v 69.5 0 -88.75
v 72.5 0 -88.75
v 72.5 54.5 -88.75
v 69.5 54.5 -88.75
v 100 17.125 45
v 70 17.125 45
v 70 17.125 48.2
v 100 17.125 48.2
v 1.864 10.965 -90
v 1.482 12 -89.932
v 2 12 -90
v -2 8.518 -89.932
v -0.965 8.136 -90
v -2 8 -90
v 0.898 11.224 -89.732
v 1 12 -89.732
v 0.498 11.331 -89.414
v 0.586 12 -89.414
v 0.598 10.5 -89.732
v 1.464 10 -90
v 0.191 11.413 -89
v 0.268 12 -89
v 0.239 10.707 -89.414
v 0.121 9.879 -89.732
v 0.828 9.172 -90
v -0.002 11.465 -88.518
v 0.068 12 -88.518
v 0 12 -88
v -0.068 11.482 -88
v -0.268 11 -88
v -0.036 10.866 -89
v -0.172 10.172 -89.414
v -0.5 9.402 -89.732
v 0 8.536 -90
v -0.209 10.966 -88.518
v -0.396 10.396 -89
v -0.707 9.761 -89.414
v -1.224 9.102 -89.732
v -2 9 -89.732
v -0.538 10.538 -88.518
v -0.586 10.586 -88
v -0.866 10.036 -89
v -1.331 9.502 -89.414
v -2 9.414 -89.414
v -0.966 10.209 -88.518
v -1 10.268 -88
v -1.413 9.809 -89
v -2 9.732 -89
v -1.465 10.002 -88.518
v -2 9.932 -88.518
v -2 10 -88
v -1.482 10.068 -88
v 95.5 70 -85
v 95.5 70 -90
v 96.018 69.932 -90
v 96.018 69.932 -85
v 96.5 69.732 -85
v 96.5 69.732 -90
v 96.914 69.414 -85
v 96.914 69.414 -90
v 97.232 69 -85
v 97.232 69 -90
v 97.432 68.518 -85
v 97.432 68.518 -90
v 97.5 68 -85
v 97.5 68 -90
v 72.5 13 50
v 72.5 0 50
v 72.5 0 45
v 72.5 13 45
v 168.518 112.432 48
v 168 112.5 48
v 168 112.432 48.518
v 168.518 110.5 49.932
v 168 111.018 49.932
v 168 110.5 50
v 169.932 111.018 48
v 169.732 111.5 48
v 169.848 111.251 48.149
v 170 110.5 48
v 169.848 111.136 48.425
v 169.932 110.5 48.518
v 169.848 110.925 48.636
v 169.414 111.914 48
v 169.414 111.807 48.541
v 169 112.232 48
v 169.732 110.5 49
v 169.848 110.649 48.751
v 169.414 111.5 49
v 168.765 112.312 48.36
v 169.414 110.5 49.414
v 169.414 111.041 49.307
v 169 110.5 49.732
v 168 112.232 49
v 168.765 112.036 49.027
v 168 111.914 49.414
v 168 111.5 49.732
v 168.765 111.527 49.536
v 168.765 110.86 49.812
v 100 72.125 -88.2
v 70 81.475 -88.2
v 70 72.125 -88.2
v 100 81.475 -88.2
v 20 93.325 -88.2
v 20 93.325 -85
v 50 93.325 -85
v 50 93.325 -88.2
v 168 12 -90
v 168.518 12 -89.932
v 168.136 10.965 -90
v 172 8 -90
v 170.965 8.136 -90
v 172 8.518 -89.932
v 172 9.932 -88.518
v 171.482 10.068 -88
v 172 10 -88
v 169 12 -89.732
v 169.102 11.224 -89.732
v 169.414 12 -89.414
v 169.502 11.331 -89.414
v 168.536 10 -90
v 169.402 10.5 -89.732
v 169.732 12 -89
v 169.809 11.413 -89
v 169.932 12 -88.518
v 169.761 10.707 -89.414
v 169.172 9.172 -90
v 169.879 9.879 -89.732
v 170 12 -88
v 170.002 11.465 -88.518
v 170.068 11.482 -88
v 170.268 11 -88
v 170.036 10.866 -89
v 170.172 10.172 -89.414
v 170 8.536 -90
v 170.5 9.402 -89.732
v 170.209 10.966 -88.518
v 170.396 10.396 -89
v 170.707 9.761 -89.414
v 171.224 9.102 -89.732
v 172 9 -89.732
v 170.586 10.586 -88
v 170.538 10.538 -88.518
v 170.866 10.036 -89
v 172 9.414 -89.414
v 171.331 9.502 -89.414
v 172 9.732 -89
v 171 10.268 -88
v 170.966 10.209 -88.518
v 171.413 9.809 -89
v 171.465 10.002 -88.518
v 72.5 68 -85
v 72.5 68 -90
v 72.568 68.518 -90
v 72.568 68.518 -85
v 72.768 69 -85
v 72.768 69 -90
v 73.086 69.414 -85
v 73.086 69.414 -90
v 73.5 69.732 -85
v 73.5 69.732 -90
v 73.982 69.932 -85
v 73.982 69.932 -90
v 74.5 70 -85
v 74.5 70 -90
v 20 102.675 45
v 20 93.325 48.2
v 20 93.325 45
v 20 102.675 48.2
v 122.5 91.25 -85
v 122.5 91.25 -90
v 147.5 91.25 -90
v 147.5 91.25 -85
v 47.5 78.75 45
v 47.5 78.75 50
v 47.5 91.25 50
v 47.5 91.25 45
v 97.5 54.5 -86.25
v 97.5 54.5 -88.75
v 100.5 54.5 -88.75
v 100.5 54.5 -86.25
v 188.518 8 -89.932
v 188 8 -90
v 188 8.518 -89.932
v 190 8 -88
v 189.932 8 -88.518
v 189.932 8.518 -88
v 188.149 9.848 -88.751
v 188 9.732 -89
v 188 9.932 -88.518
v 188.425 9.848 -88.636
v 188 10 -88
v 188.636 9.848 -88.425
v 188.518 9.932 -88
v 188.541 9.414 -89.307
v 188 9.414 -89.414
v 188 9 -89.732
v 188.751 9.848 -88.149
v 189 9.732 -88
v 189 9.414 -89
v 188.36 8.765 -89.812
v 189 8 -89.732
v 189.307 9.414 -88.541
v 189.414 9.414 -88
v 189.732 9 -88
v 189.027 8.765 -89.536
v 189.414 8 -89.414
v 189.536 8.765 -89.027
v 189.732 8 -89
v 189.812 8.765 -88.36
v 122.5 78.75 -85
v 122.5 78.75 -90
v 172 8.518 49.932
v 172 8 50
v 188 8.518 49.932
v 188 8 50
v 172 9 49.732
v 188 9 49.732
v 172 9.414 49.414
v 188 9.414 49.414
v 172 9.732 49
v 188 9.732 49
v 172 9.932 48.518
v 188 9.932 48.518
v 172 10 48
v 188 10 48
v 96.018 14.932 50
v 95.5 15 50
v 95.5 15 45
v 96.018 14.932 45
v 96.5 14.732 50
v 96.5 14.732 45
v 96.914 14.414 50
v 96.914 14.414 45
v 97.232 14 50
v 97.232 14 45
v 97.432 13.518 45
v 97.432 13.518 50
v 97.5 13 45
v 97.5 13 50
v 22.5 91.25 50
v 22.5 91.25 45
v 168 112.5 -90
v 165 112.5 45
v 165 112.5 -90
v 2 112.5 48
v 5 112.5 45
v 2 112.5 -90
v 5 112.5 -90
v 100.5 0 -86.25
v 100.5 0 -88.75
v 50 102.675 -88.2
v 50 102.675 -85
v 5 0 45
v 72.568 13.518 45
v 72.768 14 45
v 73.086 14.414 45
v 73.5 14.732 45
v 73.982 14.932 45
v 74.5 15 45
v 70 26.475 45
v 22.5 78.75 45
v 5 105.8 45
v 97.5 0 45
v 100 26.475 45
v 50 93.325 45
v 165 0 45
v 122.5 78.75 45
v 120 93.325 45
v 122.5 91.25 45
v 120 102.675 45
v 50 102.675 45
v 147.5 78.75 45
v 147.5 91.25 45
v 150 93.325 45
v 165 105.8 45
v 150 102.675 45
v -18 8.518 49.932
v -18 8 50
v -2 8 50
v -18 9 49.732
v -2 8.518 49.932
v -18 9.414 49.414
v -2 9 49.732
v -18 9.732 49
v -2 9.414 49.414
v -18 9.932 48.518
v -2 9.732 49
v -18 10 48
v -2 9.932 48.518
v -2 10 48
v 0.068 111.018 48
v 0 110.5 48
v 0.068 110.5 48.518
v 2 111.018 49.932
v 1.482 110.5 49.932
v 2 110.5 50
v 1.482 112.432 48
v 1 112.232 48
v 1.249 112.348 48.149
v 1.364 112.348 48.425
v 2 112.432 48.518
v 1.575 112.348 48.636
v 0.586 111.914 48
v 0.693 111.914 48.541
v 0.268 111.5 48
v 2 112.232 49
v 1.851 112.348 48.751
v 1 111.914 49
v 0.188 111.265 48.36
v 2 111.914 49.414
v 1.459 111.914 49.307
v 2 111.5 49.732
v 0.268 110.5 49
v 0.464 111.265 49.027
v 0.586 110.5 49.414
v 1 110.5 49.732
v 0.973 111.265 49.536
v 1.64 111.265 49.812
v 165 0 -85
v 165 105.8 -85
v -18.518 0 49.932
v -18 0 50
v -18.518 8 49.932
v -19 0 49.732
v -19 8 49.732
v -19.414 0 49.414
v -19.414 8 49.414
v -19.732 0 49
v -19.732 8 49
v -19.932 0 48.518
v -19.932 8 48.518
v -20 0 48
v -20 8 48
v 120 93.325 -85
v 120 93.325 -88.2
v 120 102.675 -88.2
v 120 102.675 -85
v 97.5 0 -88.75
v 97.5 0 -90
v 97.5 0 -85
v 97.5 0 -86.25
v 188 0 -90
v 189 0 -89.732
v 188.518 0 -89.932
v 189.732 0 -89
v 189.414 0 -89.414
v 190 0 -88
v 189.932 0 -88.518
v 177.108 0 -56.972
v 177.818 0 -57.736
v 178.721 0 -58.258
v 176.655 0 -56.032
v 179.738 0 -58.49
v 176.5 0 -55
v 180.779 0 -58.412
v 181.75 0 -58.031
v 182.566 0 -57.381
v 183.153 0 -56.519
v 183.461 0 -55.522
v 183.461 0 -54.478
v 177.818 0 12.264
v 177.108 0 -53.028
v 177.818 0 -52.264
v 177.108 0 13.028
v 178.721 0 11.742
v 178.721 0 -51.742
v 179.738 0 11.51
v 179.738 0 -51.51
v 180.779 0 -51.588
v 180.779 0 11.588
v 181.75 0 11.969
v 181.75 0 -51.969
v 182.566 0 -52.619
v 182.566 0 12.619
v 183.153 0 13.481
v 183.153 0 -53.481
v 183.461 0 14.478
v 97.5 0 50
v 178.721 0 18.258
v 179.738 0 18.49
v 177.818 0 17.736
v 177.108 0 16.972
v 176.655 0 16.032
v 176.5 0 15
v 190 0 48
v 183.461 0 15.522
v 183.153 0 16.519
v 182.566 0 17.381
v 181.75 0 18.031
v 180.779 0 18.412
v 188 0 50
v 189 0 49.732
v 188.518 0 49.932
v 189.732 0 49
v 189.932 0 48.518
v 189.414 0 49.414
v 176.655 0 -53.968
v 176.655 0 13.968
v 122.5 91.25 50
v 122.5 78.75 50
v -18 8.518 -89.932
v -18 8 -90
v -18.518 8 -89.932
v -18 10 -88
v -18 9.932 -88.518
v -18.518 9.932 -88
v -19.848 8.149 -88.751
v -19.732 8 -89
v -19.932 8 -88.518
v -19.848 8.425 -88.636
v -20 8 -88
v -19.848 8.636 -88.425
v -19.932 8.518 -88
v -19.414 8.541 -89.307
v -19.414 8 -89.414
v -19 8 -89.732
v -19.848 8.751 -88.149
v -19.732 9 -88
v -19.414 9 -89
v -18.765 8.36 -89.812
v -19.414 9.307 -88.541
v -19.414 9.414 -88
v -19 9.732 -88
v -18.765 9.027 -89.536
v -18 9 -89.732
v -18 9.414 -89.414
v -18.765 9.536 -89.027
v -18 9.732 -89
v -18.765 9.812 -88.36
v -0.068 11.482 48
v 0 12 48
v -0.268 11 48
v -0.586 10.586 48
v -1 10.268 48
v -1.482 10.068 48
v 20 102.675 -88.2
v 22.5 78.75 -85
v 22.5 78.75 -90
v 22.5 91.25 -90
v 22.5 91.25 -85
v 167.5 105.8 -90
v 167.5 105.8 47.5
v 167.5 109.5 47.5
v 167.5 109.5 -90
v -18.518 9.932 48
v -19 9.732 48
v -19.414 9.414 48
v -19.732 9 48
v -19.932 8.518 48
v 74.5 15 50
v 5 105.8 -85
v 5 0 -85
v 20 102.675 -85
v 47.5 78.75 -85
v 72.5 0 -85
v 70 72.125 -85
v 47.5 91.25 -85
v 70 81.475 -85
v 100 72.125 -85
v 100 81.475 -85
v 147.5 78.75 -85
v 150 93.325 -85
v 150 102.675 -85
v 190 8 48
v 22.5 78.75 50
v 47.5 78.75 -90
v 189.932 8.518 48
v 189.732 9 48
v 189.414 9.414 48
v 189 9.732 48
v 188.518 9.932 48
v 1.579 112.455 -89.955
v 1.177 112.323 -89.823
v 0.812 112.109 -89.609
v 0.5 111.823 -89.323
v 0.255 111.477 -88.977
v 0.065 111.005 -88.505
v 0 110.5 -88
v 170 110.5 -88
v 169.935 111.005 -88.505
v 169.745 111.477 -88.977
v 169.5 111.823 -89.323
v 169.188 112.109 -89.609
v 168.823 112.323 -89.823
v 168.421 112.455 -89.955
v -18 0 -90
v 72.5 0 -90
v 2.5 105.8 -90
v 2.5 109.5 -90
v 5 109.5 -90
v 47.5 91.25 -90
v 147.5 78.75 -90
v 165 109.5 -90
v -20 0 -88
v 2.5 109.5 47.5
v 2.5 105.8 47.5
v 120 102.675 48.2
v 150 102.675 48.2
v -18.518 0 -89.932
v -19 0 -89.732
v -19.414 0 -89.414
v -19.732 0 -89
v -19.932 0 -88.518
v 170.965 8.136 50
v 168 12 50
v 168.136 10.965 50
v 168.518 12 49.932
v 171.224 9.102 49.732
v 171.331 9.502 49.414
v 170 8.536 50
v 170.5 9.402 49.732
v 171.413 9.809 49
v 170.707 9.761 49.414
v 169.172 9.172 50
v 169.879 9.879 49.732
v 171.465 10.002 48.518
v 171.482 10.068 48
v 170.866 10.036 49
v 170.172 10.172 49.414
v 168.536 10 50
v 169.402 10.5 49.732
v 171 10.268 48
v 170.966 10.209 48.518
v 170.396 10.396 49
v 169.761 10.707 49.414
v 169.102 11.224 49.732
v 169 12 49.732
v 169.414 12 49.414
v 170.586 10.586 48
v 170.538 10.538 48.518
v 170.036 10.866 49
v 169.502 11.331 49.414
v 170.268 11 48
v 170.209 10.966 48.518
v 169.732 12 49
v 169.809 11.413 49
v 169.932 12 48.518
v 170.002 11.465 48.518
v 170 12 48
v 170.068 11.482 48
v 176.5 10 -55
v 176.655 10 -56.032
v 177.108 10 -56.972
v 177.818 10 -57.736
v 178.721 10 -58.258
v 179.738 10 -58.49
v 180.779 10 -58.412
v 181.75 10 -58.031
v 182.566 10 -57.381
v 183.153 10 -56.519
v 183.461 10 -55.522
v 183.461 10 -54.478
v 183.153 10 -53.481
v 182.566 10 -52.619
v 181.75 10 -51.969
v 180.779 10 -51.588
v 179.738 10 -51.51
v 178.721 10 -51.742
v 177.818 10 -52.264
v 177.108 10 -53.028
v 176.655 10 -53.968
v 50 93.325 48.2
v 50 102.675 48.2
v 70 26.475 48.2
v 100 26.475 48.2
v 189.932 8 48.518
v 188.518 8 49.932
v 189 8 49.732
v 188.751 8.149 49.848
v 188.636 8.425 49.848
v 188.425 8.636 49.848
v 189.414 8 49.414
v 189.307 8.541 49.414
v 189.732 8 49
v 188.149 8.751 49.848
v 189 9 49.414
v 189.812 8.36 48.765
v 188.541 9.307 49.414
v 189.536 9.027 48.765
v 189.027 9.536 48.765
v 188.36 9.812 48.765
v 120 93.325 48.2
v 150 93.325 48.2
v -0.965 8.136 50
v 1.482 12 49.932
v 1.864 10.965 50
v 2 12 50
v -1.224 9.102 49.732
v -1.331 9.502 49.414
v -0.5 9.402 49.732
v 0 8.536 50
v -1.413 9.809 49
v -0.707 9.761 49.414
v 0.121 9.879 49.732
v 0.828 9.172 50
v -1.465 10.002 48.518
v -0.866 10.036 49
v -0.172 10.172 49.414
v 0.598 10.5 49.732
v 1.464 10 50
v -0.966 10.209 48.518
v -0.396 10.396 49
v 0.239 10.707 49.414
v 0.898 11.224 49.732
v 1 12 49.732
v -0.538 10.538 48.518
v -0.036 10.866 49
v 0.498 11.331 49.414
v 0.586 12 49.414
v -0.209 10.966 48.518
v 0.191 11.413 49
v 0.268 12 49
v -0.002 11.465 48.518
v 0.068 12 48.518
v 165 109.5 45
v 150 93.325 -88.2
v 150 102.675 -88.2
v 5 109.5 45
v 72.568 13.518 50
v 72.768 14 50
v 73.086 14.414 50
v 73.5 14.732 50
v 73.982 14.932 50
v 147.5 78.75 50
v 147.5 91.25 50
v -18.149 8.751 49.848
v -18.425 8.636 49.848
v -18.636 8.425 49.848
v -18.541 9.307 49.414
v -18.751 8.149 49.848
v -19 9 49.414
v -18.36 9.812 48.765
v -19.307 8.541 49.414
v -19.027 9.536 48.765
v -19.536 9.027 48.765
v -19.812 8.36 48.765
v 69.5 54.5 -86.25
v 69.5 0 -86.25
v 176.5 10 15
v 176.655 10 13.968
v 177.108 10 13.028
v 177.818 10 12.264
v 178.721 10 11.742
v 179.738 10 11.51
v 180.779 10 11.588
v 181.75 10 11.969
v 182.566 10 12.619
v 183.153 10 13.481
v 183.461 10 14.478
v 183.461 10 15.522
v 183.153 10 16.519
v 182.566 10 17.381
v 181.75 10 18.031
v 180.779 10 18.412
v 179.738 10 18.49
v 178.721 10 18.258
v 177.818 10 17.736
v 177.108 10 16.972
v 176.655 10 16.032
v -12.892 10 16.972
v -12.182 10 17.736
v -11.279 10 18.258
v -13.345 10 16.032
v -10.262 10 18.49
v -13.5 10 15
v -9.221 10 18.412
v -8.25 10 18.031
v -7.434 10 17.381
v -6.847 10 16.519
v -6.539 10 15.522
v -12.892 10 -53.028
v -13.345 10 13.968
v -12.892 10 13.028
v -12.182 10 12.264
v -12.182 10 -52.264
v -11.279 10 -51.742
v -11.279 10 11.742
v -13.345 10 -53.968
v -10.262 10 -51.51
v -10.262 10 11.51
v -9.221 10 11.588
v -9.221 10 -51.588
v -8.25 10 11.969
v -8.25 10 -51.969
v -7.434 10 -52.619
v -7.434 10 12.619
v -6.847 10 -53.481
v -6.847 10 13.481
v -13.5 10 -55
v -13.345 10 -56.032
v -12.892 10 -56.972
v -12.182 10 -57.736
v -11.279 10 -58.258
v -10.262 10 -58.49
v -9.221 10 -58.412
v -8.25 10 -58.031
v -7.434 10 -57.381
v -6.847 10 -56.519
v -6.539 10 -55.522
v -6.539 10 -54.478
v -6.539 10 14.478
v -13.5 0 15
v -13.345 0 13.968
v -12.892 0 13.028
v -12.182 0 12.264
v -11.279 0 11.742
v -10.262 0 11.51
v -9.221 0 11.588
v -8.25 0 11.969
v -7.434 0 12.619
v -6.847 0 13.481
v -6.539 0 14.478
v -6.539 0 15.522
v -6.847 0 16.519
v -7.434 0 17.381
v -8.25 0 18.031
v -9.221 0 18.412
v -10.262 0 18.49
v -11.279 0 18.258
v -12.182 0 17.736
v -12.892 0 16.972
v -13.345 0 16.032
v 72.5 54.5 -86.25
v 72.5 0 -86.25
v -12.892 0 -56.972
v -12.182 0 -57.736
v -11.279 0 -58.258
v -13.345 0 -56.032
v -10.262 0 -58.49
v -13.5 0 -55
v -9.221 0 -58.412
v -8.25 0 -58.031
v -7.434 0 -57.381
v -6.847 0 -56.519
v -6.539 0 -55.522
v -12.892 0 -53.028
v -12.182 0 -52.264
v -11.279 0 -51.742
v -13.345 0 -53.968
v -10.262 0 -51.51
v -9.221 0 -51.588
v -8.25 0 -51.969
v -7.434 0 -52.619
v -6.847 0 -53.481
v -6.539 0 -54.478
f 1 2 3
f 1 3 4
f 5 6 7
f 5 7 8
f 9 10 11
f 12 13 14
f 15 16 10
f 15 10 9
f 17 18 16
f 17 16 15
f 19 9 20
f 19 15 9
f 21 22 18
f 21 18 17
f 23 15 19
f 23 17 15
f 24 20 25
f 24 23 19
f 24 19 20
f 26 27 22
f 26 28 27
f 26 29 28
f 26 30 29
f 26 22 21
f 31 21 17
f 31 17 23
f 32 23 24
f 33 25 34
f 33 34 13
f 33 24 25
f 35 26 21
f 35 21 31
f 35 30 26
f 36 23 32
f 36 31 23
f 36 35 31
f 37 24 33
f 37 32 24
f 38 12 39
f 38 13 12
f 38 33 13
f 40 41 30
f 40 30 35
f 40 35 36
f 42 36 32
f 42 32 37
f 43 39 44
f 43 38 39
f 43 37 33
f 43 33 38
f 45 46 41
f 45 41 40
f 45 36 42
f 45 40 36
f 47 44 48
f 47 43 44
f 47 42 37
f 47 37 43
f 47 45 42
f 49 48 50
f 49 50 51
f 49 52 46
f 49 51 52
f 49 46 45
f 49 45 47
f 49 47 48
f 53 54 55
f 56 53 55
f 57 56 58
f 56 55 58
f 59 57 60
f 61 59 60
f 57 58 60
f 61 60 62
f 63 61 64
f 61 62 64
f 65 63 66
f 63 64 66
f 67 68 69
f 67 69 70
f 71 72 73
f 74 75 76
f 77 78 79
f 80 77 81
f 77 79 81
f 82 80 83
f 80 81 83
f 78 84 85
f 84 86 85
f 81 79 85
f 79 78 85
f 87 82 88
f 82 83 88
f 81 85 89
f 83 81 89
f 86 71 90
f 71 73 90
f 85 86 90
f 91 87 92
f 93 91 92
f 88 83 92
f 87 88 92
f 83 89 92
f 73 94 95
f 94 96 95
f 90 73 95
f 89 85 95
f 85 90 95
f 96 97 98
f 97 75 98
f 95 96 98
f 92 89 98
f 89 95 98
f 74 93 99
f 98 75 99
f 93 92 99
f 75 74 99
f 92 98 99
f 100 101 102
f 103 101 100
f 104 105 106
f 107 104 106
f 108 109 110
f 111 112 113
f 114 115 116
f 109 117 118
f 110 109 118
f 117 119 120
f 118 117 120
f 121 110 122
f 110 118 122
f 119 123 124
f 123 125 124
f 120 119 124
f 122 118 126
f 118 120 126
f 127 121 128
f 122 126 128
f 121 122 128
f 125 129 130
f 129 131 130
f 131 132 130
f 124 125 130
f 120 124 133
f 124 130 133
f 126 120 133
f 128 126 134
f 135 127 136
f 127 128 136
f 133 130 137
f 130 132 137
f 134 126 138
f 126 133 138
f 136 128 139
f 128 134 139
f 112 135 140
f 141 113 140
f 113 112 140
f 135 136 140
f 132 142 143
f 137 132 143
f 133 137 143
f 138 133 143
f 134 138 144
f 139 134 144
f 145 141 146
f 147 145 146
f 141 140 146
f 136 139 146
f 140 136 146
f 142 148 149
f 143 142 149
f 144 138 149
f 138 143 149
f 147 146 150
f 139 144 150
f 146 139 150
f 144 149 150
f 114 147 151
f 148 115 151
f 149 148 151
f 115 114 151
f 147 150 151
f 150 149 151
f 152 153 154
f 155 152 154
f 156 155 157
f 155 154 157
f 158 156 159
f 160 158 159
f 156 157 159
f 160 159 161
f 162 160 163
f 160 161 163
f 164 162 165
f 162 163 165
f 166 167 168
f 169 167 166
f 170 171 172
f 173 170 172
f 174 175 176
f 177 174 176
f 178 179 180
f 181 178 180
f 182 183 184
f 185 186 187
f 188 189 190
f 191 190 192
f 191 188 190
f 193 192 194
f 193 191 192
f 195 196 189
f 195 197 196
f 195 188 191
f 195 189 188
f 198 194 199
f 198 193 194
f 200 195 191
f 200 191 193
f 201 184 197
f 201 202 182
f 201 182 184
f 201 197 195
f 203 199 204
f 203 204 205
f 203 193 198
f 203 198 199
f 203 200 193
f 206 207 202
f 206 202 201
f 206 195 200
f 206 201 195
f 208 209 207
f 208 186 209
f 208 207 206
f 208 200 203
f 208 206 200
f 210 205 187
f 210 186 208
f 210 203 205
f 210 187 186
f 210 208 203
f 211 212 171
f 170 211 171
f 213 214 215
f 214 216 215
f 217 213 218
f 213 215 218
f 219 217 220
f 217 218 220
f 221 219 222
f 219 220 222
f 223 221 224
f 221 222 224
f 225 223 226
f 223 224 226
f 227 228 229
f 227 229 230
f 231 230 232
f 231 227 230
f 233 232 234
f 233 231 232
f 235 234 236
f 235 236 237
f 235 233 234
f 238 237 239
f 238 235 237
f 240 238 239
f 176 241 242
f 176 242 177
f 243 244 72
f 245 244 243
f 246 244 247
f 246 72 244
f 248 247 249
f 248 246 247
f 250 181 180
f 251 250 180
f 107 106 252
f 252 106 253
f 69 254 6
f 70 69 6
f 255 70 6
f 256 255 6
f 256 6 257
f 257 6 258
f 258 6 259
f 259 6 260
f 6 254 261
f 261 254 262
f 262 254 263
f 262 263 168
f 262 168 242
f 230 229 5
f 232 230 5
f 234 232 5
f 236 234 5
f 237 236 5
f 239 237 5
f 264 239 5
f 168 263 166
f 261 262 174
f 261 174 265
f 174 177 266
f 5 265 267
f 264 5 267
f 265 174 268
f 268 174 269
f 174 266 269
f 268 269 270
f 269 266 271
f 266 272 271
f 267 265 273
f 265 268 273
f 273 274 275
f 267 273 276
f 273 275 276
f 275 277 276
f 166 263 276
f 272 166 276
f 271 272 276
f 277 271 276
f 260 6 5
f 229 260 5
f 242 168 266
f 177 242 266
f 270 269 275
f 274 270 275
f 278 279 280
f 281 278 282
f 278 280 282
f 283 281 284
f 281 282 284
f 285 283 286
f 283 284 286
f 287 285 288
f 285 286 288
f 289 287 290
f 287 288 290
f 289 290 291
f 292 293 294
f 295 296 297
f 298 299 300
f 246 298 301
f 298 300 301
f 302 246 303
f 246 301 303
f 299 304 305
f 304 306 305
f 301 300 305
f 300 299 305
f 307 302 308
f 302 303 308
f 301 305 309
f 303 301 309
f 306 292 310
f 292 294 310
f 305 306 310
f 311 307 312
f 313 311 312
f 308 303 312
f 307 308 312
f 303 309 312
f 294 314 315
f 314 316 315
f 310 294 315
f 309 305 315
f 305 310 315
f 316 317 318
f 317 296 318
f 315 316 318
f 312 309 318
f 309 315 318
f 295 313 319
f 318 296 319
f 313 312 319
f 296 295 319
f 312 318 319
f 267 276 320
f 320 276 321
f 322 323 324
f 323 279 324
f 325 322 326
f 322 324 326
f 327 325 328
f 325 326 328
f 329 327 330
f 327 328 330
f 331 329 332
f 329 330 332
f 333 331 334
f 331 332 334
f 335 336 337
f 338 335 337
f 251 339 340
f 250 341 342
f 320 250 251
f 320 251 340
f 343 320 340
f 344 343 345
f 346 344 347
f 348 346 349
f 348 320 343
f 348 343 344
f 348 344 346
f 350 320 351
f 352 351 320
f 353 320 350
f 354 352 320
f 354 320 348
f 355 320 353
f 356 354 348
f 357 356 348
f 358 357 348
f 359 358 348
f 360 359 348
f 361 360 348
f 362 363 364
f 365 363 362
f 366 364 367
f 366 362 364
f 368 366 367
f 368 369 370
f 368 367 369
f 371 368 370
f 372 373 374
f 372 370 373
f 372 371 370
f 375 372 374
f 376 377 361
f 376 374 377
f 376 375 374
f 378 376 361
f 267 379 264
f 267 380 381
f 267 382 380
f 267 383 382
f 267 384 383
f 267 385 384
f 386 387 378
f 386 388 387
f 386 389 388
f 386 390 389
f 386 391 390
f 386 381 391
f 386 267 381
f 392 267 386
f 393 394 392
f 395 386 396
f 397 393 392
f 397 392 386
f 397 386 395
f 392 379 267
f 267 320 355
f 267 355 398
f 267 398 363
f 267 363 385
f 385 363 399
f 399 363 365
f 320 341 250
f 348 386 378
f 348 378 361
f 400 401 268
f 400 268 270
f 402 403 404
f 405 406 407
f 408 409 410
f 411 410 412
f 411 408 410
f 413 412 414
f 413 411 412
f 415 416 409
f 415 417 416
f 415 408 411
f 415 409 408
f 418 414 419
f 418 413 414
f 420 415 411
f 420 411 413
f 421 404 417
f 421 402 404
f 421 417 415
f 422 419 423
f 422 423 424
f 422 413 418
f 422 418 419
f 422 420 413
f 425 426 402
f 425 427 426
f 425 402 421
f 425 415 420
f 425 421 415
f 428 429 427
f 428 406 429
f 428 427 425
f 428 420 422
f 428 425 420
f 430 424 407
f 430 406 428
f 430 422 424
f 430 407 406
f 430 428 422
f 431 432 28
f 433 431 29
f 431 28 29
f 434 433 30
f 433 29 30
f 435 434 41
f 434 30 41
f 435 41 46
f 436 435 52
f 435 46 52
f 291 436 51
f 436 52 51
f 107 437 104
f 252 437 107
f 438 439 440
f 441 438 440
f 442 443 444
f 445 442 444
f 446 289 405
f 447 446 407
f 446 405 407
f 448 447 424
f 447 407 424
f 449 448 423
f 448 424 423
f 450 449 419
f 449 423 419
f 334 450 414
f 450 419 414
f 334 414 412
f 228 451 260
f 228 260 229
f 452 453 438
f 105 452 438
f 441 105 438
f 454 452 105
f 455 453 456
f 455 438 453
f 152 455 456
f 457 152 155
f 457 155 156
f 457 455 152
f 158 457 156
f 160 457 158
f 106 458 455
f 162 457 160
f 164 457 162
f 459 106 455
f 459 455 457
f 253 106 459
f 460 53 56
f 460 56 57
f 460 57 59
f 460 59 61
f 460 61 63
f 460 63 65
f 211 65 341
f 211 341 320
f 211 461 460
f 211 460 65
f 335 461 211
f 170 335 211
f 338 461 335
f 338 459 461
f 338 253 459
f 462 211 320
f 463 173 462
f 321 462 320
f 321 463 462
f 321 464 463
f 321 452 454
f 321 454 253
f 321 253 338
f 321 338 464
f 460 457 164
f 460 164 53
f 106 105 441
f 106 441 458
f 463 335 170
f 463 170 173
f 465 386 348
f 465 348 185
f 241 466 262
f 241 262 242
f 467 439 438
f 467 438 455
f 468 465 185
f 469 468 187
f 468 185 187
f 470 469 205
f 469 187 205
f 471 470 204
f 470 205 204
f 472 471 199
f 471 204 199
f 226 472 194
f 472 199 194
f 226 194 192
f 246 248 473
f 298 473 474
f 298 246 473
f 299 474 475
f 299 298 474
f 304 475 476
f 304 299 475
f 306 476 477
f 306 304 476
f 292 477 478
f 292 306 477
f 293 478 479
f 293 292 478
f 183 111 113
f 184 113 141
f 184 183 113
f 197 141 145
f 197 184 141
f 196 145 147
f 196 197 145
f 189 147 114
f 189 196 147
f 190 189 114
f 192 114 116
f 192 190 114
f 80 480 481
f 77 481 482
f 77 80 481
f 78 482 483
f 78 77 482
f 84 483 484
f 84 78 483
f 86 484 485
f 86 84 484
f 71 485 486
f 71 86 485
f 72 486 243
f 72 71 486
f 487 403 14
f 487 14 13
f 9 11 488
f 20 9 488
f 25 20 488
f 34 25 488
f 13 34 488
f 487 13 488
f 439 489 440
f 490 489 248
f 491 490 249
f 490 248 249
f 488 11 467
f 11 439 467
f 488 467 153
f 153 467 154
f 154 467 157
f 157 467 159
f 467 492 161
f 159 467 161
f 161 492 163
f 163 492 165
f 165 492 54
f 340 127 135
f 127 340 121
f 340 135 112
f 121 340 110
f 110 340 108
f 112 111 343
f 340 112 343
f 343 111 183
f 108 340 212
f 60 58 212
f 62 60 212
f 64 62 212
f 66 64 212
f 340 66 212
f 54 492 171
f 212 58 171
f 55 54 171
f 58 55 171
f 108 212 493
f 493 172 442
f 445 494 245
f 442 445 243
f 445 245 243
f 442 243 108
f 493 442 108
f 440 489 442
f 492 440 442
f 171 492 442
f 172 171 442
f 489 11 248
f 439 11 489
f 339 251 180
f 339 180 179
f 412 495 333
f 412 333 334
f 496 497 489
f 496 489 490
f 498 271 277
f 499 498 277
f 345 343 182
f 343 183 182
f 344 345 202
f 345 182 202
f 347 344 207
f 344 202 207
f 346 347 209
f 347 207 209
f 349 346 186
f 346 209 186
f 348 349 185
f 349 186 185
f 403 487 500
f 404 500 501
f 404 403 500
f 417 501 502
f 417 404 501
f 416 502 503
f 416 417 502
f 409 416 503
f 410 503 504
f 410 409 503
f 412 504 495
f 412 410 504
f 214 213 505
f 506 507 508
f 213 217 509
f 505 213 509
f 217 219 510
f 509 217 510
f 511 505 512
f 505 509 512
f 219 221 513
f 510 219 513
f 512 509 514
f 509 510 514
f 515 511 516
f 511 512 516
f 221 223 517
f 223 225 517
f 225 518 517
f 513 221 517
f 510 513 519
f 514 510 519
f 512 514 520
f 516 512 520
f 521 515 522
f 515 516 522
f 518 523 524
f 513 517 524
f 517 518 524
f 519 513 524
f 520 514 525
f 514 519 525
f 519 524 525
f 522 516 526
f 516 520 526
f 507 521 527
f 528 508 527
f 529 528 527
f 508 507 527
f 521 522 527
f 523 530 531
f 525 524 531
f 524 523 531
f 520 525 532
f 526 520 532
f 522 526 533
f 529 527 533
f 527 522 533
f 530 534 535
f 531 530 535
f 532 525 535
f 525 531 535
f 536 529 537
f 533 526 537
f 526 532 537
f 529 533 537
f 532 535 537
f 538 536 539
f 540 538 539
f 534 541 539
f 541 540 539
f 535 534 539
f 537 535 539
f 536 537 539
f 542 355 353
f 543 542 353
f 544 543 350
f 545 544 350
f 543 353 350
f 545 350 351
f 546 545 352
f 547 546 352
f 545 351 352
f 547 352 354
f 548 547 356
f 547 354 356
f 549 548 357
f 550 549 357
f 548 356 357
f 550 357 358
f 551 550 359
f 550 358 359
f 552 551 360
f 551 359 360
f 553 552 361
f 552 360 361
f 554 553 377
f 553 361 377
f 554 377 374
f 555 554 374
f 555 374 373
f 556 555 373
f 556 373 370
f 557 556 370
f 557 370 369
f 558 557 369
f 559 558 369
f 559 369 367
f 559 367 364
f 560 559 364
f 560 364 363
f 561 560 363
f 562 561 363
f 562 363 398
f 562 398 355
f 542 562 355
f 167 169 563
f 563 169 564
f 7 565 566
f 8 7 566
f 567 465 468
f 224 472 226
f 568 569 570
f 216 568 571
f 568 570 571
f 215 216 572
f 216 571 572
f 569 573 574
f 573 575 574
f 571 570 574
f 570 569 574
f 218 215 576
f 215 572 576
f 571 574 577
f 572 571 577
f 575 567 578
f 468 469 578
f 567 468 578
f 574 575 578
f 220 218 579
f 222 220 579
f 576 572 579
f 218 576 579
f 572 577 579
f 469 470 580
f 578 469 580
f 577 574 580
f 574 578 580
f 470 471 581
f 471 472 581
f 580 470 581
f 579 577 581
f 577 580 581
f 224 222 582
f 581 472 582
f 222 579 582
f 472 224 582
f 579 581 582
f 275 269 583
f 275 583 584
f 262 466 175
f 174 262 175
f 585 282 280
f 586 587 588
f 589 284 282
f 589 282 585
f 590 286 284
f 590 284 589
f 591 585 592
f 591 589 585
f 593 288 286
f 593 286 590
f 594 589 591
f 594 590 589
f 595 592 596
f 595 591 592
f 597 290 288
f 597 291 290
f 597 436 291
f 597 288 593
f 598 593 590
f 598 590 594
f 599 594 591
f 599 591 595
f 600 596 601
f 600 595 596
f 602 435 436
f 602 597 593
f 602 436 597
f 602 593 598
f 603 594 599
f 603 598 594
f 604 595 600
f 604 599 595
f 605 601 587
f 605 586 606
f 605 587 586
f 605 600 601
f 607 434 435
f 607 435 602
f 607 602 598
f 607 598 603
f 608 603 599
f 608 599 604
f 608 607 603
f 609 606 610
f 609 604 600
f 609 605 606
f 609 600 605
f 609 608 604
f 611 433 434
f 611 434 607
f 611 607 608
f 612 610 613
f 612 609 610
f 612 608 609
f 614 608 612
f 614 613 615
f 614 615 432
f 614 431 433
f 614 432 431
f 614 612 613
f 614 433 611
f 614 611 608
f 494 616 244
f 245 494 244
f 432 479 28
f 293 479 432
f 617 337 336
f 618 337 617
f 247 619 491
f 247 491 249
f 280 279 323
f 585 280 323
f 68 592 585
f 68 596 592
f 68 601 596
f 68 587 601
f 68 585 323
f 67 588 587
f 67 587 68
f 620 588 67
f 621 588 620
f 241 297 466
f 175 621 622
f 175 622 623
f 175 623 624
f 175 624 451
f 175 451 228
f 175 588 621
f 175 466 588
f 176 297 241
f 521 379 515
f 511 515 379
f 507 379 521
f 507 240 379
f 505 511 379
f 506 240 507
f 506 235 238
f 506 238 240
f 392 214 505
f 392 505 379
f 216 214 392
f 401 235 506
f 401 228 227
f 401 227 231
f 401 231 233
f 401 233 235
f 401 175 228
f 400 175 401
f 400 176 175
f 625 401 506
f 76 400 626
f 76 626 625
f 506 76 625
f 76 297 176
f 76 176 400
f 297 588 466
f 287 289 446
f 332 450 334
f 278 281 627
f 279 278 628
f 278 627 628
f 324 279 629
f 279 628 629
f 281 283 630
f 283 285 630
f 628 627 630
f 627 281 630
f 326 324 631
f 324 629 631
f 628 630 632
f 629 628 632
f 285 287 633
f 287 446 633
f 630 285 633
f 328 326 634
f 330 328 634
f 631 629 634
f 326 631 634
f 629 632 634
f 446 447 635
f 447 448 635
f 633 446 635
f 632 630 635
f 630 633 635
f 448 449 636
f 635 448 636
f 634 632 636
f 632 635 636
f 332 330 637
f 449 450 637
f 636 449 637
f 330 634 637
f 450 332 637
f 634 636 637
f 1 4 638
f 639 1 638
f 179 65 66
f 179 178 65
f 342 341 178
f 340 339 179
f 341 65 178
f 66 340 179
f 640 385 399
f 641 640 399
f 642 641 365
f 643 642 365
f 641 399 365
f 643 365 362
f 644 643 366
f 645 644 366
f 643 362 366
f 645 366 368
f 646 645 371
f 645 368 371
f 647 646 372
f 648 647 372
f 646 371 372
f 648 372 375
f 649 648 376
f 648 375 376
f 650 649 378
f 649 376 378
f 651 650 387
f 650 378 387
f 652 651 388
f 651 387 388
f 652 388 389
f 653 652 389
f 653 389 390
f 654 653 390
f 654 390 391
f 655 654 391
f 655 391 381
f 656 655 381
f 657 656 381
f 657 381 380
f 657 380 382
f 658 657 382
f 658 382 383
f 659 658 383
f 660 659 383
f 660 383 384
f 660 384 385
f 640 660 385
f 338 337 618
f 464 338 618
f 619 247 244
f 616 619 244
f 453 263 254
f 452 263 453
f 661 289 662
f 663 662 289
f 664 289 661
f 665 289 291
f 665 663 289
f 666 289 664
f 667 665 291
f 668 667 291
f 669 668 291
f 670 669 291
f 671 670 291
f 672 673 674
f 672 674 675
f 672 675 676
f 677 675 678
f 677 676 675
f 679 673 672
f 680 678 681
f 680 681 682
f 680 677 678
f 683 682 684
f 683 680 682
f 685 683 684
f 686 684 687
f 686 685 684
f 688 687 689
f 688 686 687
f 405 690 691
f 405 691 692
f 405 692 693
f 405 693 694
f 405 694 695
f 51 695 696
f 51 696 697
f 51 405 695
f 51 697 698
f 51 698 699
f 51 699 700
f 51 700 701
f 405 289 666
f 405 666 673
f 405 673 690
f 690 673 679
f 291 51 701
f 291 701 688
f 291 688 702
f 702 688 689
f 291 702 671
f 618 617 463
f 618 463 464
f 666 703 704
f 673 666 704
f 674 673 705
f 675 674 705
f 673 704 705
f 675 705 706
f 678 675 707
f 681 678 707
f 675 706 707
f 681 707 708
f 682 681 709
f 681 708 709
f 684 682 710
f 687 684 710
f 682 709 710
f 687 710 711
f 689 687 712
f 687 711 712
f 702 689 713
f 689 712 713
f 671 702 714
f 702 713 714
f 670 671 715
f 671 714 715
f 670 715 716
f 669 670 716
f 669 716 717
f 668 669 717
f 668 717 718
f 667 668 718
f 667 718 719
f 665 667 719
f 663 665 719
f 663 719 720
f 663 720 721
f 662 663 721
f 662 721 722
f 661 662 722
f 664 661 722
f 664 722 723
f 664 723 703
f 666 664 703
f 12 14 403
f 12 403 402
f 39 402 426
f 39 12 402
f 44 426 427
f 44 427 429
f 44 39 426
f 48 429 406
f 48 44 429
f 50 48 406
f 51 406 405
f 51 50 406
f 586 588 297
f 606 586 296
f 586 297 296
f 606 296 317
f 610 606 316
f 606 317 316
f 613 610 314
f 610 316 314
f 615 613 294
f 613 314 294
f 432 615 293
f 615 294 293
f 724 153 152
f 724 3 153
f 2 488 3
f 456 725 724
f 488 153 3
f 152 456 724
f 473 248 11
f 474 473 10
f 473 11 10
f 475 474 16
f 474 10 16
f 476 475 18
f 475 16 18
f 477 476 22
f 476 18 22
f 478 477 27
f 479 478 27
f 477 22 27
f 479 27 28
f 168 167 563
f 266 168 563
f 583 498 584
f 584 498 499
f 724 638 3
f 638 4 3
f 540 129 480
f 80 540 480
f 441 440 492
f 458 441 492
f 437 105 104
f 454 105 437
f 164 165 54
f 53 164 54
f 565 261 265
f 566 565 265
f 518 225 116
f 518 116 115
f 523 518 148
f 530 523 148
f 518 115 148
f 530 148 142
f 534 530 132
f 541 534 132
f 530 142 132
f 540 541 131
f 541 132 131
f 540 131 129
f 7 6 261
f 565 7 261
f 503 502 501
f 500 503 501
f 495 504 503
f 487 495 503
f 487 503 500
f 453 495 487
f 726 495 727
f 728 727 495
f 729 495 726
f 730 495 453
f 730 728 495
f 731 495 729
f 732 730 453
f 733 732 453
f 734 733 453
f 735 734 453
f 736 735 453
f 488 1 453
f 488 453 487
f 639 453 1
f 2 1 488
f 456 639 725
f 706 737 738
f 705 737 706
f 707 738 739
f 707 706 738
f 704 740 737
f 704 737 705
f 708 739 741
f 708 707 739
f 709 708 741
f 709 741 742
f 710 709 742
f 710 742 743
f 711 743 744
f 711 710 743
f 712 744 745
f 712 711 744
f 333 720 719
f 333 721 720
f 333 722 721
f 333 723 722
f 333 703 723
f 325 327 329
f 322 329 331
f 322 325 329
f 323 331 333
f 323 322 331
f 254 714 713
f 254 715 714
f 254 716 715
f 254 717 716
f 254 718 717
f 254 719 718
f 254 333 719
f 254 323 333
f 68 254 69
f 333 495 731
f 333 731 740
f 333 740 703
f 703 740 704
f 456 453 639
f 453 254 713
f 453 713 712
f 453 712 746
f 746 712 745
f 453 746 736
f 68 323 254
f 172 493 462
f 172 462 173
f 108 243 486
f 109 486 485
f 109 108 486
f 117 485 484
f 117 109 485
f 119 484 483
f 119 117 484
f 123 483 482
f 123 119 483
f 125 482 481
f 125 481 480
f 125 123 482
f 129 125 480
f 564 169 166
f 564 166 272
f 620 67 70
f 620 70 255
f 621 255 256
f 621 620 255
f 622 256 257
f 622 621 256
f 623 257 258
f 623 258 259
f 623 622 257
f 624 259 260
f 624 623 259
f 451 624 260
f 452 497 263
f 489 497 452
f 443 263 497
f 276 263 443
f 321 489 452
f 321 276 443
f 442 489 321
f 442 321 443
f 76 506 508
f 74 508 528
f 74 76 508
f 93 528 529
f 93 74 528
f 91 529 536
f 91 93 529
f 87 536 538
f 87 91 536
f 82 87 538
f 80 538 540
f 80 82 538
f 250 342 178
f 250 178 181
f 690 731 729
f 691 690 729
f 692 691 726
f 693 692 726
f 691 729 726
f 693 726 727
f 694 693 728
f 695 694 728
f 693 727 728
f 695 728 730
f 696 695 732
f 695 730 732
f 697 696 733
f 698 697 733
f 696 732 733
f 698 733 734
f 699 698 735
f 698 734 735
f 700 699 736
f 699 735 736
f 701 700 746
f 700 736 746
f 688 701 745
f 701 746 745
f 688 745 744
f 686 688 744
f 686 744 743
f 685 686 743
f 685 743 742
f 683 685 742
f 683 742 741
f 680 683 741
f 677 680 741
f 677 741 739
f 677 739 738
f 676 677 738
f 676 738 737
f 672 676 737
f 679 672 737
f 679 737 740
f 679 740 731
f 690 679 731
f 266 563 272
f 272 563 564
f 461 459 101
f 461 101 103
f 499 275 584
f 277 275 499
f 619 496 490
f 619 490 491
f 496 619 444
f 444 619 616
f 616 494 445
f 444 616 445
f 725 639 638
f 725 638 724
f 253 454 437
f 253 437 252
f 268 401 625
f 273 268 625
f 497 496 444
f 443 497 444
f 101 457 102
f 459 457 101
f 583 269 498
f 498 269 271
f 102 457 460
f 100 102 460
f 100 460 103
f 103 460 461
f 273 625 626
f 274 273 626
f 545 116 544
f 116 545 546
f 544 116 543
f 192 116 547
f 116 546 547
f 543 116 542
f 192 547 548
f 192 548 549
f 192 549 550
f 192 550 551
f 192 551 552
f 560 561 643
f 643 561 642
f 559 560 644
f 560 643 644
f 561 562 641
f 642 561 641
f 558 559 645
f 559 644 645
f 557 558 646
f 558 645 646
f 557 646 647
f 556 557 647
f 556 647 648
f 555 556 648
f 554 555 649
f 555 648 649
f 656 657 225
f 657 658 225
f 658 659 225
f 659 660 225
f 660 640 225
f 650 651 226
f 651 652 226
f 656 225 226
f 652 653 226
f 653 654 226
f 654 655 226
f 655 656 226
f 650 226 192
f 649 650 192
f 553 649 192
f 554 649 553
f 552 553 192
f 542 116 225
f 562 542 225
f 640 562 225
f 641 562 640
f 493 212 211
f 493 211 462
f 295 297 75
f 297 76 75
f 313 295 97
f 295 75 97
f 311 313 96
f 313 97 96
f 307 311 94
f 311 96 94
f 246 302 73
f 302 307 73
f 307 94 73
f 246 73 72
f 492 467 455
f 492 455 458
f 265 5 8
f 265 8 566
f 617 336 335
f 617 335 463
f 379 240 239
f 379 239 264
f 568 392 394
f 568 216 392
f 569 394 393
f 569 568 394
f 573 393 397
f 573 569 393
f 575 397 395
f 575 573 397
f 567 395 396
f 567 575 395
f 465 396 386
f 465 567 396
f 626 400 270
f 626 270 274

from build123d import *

# Parameters (mm, degrees)
BOSS_EXTRUDE1_DEPTH      = 170
SKETCH7_W                = 5
SKETCH7_H                = 112.5
BOSS_EXTRUDE2_DEPTH      = 130
SKETCH9_W                = 160
SKETCH9_H                = 130
CUT_EXTRUDE2_DEPTH       = 60
SKETCH10_W               = 165
SKETCH10_H               = 3.7
CUT_EXTRUDE3_DEPTH       = 137.5
SKETCH13_W               = 160
SKETCH13_H               = 6
CUT_EXTRUDE4_DEPTH       = 5
SKETCH15_W               = 20
SKETCH15_H               = 10
BOSS_EXTRUDE3_DEPTH      = 70
SKETCH16_W               = 25
SKETCH16_H               = 12.5
CUT_EXTRUDE5_DEPTH       = 5
M6_CLEARANCE_HOLE1_D     = 7
M6_CLEARANCE_HOLE1_DEPTH = 10
SKETCH26_W               = 30
SKETCH26_H               = 9.35
CUT_EXTRUDE6_DEPTH       = 68.2
SKETCH27_W               = 30
SKETCH27_H               = 9.35
CUT_EXTRUDE8_DEPTH       = 68.2
CUT_EXTRUDE10_DEPTH      = 5
CUT_EXTRUDE11_DEPTH      = 5
SKETCH30_W               = 30
SKETCH30_H               = 9.35
CUT_EXTRUDE12_DEPTH      = 68.2
CUT_EXTRUDE14_DEPTH      = 54.5
FILLET1_R                = 2


with BuildPart() as part:
    # Sketch1 → Boss-Extrude1 (new body)
    with BuildSketch(Plane(origin=(0, 0, 0), x_dir=(0, 0, -1), z_dir=(1, 0, 0))):
        Polygon((90, 112.5), (90, 0), (85, 0), (85, 107.5), (-45, 107.5), (-45, 0), (-50, 0), (-50, 112.5), align=None)
    extrude(amount=BOSS_EXTRUDE1_DEPTH)

    # Sketch7 → Boss-Extrude2 (add)
    with BuildSketch(Plane(origin=(0, 0, 45), x_dir=(-1, 0, 0), z_dir=(0, 0, -1))):
        with Locations((-167.5, 56.25)):
            Rectangle(SKETCH7_W, SKETCH7_H)
        with Locations((-2.5, 56.25)):
            Rectangle(SKETCH7_W, SKETCH7_H)
    extrude(amount=BOSS_EXTRUDE2_DEPTH)

    # Sketch9 → Cut-Extrude2 (cut)
    with BuildSketch(Plane(origin=(0, 122.5, 0), x_dir=(1, 0, 0), z_dir=(0, 1, 0))):
        with Locations((85, 20)):
            Rectangle(SKETCH9_W, SKETCH9_H)
    extrude(amount=-CUT_EXTRUDE2_DEPTH, mode=Mode.SUBTRACT)

    # Sketch10 → Cut-Extrude3 (cut)
    with BuildSketch(Plane(origin=(80, 0, -90), x_dir=(1, 0, 0), z_dir=(0, 0, 1))):
        with Locations((5, 107.65)):
            Rectangle(SKETCH10_W, SKETCH10_H)
    extrude(amount=CUT_EXTRUDE3_DEPTH, mode=Mode.SUBTRACT)

    # Sketch13 → Cut-Extrude4 (cut)
    with BuildSketch(Plane(origin=(80, 0, -90), x_dir=(1, 0, 0), z_dir=(0, 0, 1))):
        with Locations((5, 109.5)):
            Rectangle(SKETCH13_W, SKETCH13_H)
    extrude(amount=CUT_EXTRUDE4_DEPTH, mode=Mode.SUBTRACT)

    # Sketch15 → Boss-Extrude3 (add, symmetric)
    with BuildSketch(Plane.XY.offset(-20)):
        with Locations((-10, 5)):
            Rectangle(SKETCH15_W, SKETCH15_H)
        with Locations((180, 5)):
            Rectangle(SKETCH15_W, SKETCH15_H)
    extrude(amount=BOSS_EXTRUDE3_DEPTH, both=True)

    # Sketch16 → Cut-Extrude5 (cut)
    with BuildSketch(Plane.XY.offset(50)):
        with Locations((35, 85)):
            Rectangle(SKETCH16_W, SKETCH16_H)
        with Locations((135, 85)):
            Rectangle(SKETCH16_W, SKETCH16_H)
    cut_extrude5 = extrude(amount=-CUT_EXTRUDE5_DEPTH, mode=Mode.SUBTRACT)

    # M6 Clearance Hole1
    with Locations(Plane(origin=(0, 10, 0), x_dir=(1, 0, 0), z_dir=(0, 1, 0))):
        with Locations((-10, -15), (-10, 55), (180, 55), (180, -15)):
            Hole(M6_CLEARANCE_HOLE1_D / 2, depth=M6_CLEARANCE_HOLE1_DEPTH)

    # Mirror2: Cut-Extrude5 across plane
    add(cut_extrude5.mirror(Plane.XY.offset(-20)), mode=Mode.SUBTRACT)

    # Sketch26 → Cut-Extrude6 (cut, symmetric)
    with BuildSketch(Plane.XY.offset(-20)):
        with Locations((135, 98)):
            Rectangle(SKETCH26_W, SKETCH26_H)
        with Locations((35, 98)):
            Rectangle(SKETCH26_W, SKETCH26_H)
    extrude(amount=CUT_EXTRUDE6_DEPTH, both=True, mode=Mode.SUBTRACT)

    # Sketch27 → Cut-Extrude8 (cut)
    with BuildSketch(Plane.XY.offset(-20)):
        with Locations((85, 21.8)):
            Rectangle(SKETCH27_W, SKETCH27_H)
    extrude(amount=CUT_EXTRUDE8_DEPTH, mode=Mode.SUBTRACT)

    # Sketch28 → Cut-Extrude10 (cut)
    with BuildSketch(Plane(origin=(0, 0, 50), x_dir=(-1, 0, 0), z_dir=(0, 0, -1))):
        with BuildLine():
            Line((-72.5, 0), (-72.5, 13))
            ThreePointArc((-72.5, 13), (-73.085786438, 14.414213562), (-74.5, 15))
            Line((-74.5, 15), (-95.5, 15))
            ThreePointArc((-95.5, 15), (-96.914213562, 14.414213562), (-97.5, 13))
            Line((-97.5, 13), (-97.5, 0))
            Line((-97.5, 0), (-72.5, 0))
        make_face()
    extrude(amount=CUT_EXTRUDE10_DEPTH, mode=Mode.SUBTRACT)

    # Sketch29 → Cut-Extrude11 (cut)
    with BuildSketch(Plane.XY.offset(-90)):
        with BuildLine():
            Line((95.5, 52.5), (74.5, 52.5))
            ThreePointArc((74.5, 52.5), (73.085786438, 53.085786438), (72.5, 54.5))
            Line((72.5, 54.5), (72.5, 68))
            ThreePointArc((72.5, 68), (73.085786438, 69.414213562), (74.5, 70))
            Line((74.5, 70), (95.5, 70))
            ThreePointArc((95.5, 70), (96.914213562, 69.414213562), (97.5, 68))
            Line((97.5, 68), (97.5, 54.5))
            ThreePointArc((97.5, 54.5), (96.914213562, 53.085786438), (95.5, 52.5))
        make_face()
    extrude(amount=CUT_EXTRUDE11_DEPTH, mode=Mode.SUBTRACT)

    # Sketch30 → Cut-Extrude12 (cut)
    with BuildSketch(Plane.XY.offset(-20)):
        with Locations((85, 76.8)):
            Rectangle(SKETCH30_W, SKETCH30_H)
    extrude(amount=-CUT_EXTRUDE12_DEPTH, mode=Mode.SUBTRACT)

    # Sketch31 → Cut-Extrude14 (cut)
    with BuildSketch(Plane(origin=(0, 0, 0), x_dir=(1, 0, 0), z_dir=(0, 1, 0))):
        Polygon((97.5, 86.25), (100.5, 86.25), (100.5, 88.75), (97.5, 88.75), (97.5, 90), (72.5, 90), (72.5, 88.75), (69.5, 88.75), (69.5, 86.25), (72.5, 86.25), (72.5, 85), (97.5, 85), align=None)
    extrude(amount=CUT_EXTRUDE14_DEPTH, mode=Mode.SUBTRACT)

    # Fillet1
    fillet1_edges = [part.edges().sort_by_distance(p)[0] for p in [
        (0, 61.25, 50),
        (0, 112.5, -20),
        (0, 61.25, -90),
        (-10, 10, -90),
        (0, 10, -20),
        (-20, 5, -90),
        (-20, 10, -20),
        (-10, 10, 50),
        (-20, 5, 50),
        (190, 5, -90),
        (180, 10, -90),
        (190, 10, -20),
        (170, 10, -20),
        (190, 5, 50),
        (180, 10, 50),
        (85, 112.5, 50),
        (170, 61.25, -90),
        (170, 112.5, -20),
        (170, 61.25, 50),
    ]]
    fillet(fillet1_edges, radius=FILLET1_R)


solid = part.part
